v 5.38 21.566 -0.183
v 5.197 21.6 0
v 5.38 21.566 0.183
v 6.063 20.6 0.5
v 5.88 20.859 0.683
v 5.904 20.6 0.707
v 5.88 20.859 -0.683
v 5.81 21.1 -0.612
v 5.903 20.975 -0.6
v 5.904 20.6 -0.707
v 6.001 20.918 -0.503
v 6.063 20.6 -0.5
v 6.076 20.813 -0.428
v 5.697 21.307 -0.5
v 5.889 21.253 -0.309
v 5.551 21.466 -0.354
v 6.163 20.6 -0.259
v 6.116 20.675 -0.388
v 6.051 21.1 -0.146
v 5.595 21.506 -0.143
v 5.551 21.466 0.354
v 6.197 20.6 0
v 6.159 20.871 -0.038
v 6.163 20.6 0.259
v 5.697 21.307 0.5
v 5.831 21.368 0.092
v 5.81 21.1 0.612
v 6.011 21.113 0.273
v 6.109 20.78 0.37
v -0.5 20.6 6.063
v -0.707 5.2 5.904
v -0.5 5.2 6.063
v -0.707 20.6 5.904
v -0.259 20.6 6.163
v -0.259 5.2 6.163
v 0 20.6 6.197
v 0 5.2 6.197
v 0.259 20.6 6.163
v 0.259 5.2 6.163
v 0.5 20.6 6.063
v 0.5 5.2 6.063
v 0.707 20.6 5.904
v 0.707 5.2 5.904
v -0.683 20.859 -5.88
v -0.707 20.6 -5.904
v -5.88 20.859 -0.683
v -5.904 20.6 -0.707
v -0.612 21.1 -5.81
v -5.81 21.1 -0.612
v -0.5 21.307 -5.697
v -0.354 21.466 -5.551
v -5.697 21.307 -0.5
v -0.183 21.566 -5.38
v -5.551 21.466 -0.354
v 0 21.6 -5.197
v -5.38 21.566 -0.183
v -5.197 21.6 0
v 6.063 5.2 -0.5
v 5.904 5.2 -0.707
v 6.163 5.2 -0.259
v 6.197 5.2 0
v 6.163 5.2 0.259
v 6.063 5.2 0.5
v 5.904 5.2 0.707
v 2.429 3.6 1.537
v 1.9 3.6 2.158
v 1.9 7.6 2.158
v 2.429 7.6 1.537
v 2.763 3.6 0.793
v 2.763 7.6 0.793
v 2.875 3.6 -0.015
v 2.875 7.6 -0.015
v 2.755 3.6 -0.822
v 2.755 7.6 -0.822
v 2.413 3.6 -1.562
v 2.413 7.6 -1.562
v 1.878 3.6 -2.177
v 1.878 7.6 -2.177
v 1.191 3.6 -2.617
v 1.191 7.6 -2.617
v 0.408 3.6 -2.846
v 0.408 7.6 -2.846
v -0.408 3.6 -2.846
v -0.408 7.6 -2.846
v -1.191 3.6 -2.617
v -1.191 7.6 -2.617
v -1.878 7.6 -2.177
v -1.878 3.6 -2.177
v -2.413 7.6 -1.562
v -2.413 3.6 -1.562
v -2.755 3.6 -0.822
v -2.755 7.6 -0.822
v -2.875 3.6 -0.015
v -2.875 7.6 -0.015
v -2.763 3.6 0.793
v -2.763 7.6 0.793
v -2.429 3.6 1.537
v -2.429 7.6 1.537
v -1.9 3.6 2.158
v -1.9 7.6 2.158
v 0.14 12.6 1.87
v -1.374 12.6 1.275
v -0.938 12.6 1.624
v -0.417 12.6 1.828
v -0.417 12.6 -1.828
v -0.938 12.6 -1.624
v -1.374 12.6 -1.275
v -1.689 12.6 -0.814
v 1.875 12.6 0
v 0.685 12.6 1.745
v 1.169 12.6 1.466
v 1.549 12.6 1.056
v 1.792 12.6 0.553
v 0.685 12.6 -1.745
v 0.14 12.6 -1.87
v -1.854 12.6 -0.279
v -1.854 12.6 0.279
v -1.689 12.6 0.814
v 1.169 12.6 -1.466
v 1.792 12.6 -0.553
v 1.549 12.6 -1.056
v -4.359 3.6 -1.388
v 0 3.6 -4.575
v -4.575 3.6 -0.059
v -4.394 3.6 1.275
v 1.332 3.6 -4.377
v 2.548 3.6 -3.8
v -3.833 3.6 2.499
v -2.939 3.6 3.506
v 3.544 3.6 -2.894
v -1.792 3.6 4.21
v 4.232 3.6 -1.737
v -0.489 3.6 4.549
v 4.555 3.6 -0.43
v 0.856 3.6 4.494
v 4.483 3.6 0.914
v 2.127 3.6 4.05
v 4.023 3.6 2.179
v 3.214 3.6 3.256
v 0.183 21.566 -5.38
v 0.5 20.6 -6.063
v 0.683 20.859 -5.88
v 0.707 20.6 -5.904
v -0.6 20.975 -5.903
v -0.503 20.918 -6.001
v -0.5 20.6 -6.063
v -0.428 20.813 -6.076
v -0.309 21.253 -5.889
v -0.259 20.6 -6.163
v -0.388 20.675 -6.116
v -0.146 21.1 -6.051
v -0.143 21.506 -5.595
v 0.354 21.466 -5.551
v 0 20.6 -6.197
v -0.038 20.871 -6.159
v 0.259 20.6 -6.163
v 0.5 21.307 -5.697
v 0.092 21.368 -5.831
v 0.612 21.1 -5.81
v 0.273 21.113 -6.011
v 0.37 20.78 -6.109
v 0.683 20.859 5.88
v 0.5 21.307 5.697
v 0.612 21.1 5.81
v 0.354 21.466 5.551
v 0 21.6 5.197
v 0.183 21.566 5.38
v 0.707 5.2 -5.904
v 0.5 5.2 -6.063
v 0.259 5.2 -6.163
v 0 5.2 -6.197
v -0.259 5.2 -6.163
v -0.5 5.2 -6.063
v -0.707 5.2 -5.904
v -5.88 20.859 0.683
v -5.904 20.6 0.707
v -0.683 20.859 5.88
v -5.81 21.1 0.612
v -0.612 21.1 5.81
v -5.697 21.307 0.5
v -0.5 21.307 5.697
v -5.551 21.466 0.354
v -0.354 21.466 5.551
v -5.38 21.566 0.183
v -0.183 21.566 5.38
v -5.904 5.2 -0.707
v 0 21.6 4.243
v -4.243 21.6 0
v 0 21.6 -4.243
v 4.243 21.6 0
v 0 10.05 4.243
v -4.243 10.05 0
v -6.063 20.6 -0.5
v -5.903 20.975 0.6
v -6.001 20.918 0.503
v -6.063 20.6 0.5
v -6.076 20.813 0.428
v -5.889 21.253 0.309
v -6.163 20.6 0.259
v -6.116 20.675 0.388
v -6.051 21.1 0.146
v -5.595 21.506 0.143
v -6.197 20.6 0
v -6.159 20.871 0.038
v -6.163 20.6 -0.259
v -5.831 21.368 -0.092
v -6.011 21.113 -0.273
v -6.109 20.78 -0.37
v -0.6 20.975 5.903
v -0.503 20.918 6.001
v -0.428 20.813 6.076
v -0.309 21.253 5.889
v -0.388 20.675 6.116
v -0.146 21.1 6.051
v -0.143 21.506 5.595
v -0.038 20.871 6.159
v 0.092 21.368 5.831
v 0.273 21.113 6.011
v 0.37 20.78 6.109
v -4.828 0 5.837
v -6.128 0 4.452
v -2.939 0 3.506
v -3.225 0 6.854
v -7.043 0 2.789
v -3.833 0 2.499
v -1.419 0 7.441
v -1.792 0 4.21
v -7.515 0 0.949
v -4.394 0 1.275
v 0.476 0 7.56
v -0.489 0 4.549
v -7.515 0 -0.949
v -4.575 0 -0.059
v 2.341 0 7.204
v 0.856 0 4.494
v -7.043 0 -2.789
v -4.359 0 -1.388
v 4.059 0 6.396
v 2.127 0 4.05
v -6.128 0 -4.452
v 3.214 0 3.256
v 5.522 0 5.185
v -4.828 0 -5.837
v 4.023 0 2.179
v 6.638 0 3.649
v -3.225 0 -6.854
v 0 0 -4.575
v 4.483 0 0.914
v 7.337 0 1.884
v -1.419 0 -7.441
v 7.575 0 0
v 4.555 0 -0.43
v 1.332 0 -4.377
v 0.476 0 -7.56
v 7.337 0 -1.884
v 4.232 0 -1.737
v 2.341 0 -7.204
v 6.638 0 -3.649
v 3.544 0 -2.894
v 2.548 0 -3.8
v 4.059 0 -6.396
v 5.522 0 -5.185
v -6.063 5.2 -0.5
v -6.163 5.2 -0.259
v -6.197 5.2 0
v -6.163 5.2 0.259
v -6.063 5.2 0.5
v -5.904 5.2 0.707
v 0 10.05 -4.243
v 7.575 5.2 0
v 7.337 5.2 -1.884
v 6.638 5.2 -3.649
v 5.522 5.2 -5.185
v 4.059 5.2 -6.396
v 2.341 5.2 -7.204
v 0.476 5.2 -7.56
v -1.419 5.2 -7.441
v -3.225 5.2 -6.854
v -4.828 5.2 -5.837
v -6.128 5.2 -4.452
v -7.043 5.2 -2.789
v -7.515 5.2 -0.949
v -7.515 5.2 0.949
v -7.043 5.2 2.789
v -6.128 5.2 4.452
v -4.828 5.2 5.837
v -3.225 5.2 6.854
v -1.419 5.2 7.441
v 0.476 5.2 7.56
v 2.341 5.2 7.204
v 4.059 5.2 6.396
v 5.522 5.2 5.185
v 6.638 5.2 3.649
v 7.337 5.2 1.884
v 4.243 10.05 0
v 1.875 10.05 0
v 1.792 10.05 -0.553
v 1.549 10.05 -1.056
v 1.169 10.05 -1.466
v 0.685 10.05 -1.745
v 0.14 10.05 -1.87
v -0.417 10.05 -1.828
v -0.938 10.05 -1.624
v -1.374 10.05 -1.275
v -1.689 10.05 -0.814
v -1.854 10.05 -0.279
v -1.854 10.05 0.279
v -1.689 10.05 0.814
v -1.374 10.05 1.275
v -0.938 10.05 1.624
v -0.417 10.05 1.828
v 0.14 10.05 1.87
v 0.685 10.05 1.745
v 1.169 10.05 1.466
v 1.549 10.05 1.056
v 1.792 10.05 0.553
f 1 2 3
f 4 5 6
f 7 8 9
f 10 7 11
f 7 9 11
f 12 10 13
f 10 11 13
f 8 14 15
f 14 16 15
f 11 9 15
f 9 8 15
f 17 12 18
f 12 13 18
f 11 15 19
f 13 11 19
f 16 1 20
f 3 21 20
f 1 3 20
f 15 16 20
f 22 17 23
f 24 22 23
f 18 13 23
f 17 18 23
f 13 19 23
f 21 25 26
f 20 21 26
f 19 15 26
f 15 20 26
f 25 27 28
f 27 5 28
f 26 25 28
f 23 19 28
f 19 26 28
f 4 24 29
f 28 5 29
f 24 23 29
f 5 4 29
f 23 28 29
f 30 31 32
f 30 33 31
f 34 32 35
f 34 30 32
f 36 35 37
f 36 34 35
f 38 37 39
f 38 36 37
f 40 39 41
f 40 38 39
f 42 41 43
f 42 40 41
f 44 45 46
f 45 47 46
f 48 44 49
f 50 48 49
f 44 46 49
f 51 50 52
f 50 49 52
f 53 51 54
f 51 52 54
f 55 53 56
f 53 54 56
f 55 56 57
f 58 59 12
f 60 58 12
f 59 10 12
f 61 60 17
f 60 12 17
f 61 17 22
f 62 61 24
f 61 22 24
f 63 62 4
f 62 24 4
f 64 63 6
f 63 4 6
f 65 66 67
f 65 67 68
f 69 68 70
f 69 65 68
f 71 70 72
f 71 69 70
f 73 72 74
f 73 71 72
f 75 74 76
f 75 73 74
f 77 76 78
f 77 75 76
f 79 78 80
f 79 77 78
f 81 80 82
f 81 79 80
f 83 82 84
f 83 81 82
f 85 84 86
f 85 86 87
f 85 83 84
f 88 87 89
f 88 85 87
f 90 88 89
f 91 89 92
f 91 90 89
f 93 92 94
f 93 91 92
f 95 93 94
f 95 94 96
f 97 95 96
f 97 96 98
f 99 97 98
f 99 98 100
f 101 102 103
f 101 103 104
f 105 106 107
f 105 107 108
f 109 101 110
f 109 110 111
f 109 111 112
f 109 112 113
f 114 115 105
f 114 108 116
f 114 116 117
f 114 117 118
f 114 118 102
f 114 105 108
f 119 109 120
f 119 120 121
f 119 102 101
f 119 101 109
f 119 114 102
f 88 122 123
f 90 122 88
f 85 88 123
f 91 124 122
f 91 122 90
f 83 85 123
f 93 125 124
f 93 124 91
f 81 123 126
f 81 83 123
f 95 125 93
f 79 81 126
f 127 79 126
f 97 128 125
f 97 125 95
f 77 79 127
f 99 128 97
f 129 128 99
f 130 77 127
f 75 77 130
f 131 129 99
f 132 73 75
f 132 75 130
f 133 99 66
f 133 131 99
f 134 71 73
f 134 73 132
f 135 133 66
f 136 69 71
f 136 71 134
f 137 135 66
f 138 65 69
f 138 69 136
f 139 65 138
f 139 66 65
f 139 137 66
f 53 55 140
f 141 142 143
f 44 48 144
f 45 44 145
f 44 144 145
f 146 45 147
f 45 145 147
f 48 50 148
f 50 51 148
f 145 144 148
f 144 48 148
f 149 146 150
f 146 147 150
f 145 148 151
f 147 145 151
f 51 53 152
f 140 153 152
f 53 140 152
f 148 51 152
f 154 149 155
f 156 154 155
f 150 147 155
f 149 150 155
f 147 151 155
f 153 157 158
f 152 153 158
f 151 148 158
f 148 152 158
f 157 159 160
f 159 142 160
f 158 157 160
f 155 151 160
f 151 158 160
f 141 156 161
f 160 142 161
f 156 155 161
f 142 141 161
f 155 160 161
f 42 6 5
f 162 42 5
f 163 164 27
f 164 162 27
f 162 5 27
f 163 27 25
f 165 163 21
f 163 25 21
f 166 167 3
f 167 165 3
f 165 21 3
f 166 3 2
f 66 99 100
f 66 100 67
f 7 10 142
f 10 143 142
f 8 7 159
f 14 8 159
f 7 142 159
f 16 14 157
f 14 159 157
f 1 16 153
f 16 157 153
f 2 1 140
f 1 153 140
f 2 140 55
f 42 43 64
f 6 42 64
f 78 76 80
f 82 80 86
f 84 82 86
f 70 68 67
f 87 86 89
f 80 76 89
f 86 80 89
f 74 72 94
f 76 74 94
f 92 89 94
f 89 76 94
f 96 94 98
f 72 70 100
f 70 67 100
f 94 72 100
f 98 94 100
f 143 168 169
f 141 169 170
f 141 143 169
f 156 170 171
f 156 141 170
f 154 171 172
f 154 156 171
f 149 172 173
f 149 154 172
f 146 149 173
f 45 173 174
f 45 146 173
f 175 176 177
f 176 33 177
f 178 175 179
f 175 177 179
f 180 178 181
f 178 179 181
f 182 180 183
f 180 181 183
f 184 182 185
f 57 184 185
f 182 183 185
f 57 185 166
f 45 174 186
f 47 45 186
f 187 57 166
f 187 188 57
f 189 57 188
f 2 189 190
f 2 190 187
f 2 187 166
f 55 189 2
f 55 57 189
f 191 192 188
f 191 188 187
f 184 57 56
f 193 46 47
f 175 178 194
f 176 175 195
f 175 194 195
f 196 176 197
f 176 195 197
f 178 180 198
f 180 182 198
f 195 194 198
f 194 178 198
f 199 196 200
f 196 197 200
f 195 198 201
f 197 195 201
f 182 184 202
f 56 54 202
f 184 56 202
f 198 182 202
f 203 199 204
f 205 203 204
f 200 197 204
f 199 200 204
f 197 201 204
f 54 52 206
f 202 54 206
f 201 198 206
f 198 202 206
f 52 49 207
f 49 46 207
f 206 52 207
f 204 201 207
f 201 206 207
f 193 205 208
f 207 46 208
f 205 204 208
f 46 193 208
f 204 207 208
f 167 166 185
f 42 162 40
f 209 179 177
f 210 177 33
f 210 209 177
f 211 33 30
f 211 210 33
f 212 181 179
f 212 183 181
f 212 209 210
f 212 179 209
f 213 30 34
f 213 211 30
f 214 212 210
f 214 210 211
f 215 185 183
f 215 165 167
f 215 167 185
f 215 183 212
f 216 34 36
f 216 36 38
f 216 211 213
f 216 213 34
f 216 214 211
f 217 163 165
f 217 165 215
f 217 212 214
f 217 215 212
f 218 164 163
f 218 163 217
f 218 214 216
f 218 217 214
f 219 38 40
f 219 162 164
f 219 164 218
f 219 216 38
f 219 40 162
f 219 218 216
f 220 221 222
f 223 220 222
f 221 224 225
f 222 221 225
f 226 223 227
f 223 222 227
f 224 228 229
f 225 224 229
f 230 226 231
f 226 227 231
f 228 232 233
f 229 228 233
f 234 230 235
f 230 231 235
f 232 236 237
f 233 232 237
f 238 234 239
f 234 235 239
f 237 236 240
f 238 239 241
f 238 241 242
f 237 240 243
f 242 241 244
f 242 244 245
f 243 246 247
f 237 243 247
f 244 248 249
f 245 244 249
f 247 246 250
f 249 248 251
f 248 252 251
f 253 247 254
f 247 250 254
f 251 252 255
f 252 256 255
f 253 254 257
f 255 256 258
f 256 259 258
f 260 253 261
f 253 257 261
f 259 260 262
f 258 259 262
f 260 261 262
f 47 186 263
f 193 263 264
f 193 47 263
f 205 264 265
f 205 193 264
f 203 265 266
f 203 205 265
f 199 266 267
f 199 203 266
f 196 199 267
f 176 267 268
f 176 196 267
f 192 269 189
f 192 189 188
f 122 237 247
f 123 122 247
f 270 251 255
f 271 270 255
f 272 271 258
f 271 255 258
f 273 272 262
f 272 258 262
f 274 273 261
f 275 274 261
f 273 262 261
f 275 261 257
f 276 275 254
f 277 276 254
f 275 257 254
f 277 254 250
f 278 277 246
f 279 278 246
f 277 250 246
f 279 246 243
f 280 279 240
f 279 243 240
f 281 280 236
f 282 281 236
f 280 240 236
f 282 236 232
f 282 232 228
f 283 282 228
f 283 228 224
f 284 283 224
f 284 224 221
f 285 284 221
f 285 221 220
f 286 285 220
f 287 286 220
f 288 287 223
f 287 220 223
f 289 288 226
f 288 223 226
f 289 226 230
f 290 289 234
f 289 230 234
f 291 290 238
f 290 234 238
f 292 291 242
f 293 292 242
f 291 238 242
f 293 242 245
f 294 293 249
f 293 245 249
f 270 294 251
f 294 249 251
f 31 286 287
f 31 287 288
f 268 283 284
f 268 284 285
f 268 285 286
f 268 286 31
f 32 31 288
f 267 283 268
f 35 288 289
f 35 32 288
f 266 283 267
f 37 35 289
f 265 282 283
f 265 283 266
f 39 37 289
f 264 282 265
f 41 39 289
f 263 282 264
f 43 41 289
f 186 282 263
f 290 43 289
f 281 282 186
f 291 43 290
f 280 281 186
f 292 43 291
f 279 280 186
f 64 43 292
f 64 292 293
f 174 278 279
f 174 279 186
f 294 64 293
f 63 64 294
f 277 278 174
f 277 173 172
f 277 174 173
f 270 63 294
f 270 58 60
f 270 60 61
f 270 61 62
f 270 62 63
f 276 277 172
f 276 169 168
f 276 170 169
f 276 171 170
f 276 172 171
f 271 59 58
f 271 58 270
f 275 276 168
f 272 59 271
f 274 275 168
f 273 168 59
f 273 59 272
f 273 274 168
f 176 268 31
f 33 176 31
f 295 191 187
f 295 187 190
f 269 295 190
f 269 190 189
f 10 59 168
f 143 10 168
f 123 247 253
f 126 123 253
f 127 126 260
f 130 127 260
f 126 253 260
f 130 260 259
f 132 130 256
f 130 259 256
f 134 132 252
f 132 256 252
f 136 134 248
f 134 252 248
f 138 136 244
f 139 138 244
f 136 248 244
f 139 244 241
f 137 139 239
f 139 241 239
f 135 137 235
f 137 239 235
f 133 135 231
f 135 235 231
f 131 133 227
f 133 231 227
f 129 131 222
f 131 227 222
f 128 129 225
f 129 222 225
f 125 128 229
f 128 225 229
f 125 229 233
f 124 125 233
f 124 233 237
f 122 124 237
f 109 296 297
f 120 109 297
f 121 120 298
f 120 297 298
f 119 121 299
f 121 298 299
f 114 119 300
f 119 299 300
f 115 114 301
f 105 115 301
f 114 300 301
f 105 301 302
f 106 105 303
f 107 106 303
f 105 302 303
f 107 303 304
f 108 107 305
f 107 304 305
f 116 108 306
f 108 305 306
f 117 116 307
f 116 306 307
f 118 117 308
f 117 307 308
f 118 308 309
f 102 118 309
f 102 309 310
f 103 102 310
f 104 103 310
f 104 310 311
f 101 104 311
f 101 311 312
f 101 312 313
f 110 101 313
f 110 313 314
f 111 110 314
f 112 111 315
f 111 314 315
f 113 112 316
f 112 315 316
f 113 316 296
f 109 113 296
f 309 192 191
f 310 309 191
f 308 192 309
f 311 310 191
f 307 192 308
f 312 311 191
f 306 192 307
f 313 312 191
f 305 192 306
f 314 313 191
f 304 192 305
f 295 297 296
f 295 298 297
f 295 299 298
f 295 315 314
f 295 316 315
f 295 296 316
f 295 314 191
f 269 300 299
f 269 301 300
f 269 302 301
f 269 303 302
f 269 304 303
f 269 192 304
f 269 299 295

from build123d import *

# Parameters (mm, degrees)
SKETCH1_R           = 7.575
BOSS_EXTRUDE1_DEPTH = 5.2
CUT_EXTRUDE1_DEPTH  = 3.6
BOSS_EXTRUDE2_DEPTH = 16.4
FILLET1_R           = 1
BOSS_EXTRUDE3_DEPTH = 4.85
SKETCH6_R           = 1.875
BOSS_EXTRUDE4_DEPTH = 2.55
CUT_EXTRUDE2_DEPTH  = 4


with BuildPart() as part:
    # Sketch1 → Boss-Extrude1 (new body)
    with BuildSketch(Plane(origin=(0, 0, 0), x_dir=(1, 0, 0), z_dir=(0, 1, 0))):
        Circle(SKETCH1_R)
    extrude(amount=BOSS_EXTRUDE1_DEPTH)

    # Sketch2 → Cut-Extrude1 (cut)
    with BuildSketch(Plane.XZ):
        with BuildLine():
            Line((-4.359330502, -1.388114754), (0, -4.575))
            ThreePointArc((0, -4.575), (2.7, 3.693321676), (-4.359330502, -1.388114754))
        make_face()
    extrude(amount=-CUT_EXTRUDE1_DEPTH, mode=Mode.SUBTRACT)

    # Sketch4 → Boss-Extrude2 (add)
    with BuildSketch(Plane(origin=(0, 5.2, 0), x_dir=(1, 0, 0), z_dir=(0, 1, 0))):
        Polygon((6.611448404, 0), (0, 6.611448404), (-6.611448404, 0), (0, -6.611448404), align=None)
        Polygon((4.242640687, 0), (0, 4.242640687), (-4.242640687, 0), (0, -4.242640687), align=None, mode=Mode.SUBTRACT)
    extrude(amount=BOSS_EXTRUDE2_DEPTH)

    # Fillet1
    fillet1_edges = [part.edges().sort_by_distance(p)[0] for p in [
        (3.305724202, 21.6, 3.305724202),
        (3.305724202, 21.6, -3.305724202),
        (-3.305724202, 21.6, -3.305724202),
        (-3.305724202, 21.6, 3.305724202),
        (0, 13.4, 6.611448404),
        (6.611448404, 13.4, 0),
        (0, 13.4, -6.611448404),
        (-6.611448404, 13.4, 0),
    ]]
    fillet(fillet1_edges, radius=FILLET1_R)

    # Sketch5 → Boss-Extrude3 (add)
    with BuildSketch(Plane(origin=(0, 5.2, 0), x_dir=(1, 0, 0), z_dir=(0, 1, 0))):
        Polygon((0, -4.242640687), (4.242640687, 0), (0, 4.242640687), (-4.242640687, 0), align=None)
    extrude(amount=BOSS_EXTRUDE3_DEPTH)

    # Sketch6 → Boss-Extrude4 (add)
    with BuildSketch(Plane(origin=(0, 10.05, 0), x_dir=(1, 0, 0), z_dir=(0, 1, 0))):
        Circle(SKETCH6_R)
    extrude(amount=BOSS_EXTRUDE4_DEPTH)

    # Sketch3 → Cut-Extrude2 (cut)
    with BuildSketch(Plane.XZ.offset(-3.6)):
        with BuildLine():
            Line((-1.9, 2.157689737), (1.9, 2.157689737))
            ThreePointArc((1.9, 2.157689737), (0, -2.875), (-1.9, 2.157689737))
        make_face()
    extrude(amount=-CUT_EXTRUDE2_DEPTH, mode=Mode.SUBTRACT)


solid = part.part
